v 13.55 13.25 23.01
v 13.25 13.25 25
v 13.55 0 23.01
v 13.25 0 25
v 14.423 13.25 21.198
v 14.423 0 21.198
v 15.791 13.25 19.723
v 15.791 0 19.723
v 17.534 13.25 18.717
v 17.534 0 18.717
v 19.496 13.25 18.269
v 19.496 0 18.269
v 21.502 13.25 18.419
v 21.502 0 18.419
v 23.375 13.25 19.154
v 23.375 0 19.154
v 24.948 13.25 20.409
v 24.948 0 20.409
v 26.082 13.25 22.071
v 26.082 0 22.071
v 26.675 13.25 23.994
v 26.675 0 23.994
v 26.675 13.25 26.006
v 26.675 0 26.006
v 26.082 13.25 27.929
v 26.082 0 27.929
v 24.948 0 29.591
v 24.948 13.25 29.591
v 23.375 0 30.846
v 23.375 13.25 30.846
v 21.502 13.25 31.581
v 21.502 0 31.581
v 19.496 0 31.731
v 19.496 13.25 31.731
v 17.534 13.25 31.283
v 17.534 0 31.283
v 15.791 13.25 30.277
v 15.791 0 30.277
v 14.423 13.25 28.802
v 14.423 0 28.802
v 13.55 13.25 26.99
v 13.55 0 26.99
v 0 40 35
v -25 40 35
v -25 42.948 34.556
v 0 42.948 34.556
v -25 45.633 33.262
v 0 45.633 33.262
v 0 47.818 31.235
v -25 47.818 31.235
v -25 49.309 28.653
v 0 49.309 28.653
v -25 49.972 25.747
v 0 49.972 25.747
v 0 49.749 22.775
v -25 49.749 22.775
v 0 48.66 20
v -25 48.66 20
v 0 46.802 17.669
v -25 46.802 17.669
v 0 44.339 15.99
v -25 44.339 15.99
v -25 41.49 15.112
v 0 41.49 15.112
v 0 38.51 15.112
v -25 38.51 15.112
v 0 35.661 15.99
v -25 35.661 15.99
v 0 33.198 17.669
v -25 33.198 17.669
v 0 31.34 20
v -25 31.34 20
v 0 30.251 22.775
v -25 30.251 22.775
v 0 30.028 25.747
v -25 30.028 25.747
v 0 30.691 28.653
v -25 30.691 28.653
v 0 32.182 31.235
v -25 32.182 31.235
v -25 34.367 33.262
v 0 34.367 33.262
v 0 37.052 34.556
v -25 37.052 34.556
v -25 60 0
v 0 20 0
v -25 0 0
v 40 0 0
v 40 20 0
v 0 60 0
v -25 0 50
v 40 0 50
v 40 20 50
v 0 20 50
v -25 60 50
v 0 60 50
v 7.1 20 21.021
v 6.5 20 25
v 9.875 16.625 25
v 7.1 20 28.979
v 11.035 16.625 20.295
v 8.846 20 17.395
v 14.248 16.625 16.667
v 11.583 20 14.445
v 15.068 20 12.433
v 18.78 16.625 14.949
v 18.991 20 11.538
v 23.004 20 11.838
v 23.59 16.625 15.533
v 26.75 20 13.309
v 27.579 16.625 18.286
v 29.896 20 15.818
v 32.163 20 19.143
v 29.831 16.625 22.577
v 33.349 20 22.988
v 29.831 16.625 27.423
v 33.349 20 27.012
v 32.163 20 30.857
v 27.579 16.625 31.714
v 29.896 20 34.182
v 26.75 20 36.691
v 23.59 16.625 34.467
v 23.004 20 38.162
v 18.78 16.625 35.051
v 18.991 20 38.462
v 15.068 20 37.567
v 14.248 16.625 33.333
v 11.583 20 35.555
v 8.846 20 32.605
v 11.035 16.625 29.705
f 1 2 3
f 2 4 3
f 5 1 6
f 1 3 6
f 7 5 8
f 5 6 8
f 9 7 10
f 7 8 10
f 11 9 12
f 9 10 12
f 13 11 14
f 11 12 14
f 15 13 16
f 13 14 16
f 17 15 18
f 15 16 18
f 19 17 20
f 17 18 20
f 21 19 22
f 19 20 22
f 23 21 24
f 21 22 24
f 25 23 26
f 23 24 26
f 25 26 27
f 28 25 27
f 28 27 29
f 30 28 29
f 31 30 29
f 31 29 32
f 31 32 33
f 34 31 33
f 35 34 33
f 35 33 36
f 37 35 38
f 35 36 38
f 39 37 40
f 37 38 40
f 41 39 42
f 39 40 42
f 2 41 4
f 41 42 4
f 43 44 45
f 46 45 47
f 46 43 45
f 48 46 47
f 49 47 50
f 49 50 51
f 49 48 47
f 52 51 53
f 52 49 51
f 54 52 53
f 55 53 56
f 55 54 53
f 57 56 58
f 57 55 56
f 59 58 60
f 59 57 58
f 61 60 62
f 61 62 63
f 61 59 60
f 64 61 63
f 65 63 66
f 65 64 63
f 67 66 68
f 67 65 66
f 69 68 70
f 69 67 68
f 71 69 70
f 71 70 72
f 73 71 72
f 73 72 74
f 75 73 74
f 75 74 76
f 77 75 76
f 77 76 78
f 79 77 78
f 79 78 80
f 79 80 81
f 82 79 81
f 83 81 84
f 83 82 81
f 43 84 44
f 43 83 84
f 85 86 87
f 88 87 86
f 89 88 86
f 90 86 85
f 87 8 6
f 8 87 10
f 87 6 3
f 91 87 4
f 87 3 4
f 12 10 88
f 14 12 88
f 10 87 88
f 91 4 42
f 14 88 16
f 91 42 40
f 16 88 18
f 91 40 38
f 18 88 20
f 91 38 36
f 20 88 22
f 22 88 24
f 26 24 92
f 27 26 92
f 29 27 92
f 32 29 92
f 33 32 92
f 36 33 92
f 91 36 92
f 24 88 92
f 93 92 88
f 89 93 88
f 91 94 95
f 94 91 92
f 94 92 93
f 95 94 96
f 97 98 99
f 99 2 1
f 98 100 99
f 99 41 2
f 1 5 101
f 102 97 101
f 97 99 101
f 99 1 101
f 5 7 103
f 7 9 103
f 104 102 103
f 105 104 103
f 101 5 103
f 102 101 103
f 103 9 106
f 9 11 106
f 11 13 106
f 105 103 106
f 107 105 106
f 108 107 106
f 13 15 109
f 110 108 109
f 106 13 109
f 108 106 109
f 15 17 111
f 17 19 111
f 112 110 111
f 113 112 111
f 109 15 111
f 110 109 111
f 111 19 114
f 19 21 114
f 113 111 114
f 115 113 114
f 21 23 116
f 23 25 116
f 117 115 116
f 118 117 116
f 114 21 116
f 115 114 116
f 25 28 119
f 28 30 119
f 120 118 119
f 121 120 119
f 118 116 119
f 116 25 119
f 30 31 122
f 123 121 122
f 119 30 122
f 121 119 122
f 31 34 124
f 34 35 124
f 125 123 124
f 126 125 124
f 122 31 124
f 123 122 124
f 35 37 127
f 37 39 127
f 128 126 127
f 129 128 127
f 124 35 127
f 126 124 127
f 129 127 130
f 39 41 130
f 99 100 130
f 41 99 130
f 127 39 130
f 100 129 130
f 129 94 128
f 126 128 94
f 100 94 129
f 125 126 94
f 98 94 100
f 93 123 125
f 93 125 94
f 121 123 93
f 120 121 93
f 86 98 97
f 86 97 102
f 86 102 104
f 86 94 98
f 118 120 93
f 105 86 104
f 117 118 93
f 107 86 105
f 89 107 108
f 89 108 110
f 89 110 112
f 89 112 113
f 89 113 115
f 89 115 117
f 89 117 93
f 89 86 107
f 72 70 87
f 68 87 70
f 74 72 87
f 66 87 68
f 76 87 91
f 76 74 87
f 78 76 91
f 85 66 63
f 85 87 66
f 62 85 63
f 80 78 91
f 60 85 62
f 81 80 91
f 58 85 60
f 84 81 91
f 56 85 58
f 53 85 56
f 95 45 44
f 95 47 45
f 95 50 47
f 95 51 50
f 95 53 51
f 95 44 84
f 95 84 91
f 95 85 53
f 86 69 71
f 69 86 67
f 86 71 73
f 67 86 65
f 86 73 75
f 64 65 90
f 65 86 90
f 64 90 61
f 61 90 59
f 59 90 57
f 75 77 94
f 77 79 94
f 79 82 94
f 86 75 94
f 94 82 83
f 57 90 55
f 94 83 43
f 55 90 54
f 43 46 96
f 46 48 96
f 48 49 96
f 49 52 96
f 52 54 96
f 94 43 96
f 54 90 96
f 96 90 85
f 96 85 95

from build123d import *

# Parameters (mm, degrees)
SKETCH1_W                                       = 40
SKETCH1_H                                       = 50
BOSS_EXTRUDE1_DEPTH                             = 20
CSK_FOR_M2_FLAT_HEAD_MACHINE_SCREW1_D           = 13.5
CSK_FOR_M2_FLAT_HEAD_MACHINE_SCREW1_CSINK_D     = 27
CSK_FOR_M2_FLAT_HEAD_MACHINE_SCREW1_CSINK_ANGLE = 90
SKETCH4_W                                       = 50
SKETCH4_H                                       = 60
SKETCH4_R                                       = 10
BOSS_EXTRUDE2_DEPTH                             = 25


with BuildPart() as part:
    # Sketch1 → Boss-Extrude1 (new body)
    with BuildSketch(Plane(origin=(0, 0, 0), x_dir=(1, 0, 0), z_dir=(0, 1, 0))):
        with Locations((20, -25)):
            Rectangle(SKETCH1_W, SKETCH1_H)
    extrude(amount=BOSS_EXTRUDE1_DEPTH)

    # CSK for M2 Flat Head Machine Screw1 (through all)
    with Locations(Plane(origin=(0, 20, 0), x_dir=(1, 0, 0), z_dir=(0, 1, 0))):
        with Locations((20, -25)):
            CounterSinkHole(CSK_FOR_M2_FLAT_HEAD_MACHINE_SCREW1_D / 2, CSK_FOR_M2_FLAT_HEAD_MACHINE_SCREW1_CSINK_D / 2, counter_sink_angle=CSK_FOR_M2_FLAT_HEAD_MACHINE_SCREW1_CSINK_ANGLE)

    # Sketch4 → Boss-Extrude2 (add)
    with BuildSketch(Plane.ZY):
        with Locations((25, 30)):
            Rectangle(SKETCH4_W, SKETCH4_H)
        with Locations((25, 40)):
            Circle(SKETCH4_R, mode=Mode.SUBTRACT)
    extrude(amount=BOSS_EXTRUDE2_DEPTH)


solid = part.part
